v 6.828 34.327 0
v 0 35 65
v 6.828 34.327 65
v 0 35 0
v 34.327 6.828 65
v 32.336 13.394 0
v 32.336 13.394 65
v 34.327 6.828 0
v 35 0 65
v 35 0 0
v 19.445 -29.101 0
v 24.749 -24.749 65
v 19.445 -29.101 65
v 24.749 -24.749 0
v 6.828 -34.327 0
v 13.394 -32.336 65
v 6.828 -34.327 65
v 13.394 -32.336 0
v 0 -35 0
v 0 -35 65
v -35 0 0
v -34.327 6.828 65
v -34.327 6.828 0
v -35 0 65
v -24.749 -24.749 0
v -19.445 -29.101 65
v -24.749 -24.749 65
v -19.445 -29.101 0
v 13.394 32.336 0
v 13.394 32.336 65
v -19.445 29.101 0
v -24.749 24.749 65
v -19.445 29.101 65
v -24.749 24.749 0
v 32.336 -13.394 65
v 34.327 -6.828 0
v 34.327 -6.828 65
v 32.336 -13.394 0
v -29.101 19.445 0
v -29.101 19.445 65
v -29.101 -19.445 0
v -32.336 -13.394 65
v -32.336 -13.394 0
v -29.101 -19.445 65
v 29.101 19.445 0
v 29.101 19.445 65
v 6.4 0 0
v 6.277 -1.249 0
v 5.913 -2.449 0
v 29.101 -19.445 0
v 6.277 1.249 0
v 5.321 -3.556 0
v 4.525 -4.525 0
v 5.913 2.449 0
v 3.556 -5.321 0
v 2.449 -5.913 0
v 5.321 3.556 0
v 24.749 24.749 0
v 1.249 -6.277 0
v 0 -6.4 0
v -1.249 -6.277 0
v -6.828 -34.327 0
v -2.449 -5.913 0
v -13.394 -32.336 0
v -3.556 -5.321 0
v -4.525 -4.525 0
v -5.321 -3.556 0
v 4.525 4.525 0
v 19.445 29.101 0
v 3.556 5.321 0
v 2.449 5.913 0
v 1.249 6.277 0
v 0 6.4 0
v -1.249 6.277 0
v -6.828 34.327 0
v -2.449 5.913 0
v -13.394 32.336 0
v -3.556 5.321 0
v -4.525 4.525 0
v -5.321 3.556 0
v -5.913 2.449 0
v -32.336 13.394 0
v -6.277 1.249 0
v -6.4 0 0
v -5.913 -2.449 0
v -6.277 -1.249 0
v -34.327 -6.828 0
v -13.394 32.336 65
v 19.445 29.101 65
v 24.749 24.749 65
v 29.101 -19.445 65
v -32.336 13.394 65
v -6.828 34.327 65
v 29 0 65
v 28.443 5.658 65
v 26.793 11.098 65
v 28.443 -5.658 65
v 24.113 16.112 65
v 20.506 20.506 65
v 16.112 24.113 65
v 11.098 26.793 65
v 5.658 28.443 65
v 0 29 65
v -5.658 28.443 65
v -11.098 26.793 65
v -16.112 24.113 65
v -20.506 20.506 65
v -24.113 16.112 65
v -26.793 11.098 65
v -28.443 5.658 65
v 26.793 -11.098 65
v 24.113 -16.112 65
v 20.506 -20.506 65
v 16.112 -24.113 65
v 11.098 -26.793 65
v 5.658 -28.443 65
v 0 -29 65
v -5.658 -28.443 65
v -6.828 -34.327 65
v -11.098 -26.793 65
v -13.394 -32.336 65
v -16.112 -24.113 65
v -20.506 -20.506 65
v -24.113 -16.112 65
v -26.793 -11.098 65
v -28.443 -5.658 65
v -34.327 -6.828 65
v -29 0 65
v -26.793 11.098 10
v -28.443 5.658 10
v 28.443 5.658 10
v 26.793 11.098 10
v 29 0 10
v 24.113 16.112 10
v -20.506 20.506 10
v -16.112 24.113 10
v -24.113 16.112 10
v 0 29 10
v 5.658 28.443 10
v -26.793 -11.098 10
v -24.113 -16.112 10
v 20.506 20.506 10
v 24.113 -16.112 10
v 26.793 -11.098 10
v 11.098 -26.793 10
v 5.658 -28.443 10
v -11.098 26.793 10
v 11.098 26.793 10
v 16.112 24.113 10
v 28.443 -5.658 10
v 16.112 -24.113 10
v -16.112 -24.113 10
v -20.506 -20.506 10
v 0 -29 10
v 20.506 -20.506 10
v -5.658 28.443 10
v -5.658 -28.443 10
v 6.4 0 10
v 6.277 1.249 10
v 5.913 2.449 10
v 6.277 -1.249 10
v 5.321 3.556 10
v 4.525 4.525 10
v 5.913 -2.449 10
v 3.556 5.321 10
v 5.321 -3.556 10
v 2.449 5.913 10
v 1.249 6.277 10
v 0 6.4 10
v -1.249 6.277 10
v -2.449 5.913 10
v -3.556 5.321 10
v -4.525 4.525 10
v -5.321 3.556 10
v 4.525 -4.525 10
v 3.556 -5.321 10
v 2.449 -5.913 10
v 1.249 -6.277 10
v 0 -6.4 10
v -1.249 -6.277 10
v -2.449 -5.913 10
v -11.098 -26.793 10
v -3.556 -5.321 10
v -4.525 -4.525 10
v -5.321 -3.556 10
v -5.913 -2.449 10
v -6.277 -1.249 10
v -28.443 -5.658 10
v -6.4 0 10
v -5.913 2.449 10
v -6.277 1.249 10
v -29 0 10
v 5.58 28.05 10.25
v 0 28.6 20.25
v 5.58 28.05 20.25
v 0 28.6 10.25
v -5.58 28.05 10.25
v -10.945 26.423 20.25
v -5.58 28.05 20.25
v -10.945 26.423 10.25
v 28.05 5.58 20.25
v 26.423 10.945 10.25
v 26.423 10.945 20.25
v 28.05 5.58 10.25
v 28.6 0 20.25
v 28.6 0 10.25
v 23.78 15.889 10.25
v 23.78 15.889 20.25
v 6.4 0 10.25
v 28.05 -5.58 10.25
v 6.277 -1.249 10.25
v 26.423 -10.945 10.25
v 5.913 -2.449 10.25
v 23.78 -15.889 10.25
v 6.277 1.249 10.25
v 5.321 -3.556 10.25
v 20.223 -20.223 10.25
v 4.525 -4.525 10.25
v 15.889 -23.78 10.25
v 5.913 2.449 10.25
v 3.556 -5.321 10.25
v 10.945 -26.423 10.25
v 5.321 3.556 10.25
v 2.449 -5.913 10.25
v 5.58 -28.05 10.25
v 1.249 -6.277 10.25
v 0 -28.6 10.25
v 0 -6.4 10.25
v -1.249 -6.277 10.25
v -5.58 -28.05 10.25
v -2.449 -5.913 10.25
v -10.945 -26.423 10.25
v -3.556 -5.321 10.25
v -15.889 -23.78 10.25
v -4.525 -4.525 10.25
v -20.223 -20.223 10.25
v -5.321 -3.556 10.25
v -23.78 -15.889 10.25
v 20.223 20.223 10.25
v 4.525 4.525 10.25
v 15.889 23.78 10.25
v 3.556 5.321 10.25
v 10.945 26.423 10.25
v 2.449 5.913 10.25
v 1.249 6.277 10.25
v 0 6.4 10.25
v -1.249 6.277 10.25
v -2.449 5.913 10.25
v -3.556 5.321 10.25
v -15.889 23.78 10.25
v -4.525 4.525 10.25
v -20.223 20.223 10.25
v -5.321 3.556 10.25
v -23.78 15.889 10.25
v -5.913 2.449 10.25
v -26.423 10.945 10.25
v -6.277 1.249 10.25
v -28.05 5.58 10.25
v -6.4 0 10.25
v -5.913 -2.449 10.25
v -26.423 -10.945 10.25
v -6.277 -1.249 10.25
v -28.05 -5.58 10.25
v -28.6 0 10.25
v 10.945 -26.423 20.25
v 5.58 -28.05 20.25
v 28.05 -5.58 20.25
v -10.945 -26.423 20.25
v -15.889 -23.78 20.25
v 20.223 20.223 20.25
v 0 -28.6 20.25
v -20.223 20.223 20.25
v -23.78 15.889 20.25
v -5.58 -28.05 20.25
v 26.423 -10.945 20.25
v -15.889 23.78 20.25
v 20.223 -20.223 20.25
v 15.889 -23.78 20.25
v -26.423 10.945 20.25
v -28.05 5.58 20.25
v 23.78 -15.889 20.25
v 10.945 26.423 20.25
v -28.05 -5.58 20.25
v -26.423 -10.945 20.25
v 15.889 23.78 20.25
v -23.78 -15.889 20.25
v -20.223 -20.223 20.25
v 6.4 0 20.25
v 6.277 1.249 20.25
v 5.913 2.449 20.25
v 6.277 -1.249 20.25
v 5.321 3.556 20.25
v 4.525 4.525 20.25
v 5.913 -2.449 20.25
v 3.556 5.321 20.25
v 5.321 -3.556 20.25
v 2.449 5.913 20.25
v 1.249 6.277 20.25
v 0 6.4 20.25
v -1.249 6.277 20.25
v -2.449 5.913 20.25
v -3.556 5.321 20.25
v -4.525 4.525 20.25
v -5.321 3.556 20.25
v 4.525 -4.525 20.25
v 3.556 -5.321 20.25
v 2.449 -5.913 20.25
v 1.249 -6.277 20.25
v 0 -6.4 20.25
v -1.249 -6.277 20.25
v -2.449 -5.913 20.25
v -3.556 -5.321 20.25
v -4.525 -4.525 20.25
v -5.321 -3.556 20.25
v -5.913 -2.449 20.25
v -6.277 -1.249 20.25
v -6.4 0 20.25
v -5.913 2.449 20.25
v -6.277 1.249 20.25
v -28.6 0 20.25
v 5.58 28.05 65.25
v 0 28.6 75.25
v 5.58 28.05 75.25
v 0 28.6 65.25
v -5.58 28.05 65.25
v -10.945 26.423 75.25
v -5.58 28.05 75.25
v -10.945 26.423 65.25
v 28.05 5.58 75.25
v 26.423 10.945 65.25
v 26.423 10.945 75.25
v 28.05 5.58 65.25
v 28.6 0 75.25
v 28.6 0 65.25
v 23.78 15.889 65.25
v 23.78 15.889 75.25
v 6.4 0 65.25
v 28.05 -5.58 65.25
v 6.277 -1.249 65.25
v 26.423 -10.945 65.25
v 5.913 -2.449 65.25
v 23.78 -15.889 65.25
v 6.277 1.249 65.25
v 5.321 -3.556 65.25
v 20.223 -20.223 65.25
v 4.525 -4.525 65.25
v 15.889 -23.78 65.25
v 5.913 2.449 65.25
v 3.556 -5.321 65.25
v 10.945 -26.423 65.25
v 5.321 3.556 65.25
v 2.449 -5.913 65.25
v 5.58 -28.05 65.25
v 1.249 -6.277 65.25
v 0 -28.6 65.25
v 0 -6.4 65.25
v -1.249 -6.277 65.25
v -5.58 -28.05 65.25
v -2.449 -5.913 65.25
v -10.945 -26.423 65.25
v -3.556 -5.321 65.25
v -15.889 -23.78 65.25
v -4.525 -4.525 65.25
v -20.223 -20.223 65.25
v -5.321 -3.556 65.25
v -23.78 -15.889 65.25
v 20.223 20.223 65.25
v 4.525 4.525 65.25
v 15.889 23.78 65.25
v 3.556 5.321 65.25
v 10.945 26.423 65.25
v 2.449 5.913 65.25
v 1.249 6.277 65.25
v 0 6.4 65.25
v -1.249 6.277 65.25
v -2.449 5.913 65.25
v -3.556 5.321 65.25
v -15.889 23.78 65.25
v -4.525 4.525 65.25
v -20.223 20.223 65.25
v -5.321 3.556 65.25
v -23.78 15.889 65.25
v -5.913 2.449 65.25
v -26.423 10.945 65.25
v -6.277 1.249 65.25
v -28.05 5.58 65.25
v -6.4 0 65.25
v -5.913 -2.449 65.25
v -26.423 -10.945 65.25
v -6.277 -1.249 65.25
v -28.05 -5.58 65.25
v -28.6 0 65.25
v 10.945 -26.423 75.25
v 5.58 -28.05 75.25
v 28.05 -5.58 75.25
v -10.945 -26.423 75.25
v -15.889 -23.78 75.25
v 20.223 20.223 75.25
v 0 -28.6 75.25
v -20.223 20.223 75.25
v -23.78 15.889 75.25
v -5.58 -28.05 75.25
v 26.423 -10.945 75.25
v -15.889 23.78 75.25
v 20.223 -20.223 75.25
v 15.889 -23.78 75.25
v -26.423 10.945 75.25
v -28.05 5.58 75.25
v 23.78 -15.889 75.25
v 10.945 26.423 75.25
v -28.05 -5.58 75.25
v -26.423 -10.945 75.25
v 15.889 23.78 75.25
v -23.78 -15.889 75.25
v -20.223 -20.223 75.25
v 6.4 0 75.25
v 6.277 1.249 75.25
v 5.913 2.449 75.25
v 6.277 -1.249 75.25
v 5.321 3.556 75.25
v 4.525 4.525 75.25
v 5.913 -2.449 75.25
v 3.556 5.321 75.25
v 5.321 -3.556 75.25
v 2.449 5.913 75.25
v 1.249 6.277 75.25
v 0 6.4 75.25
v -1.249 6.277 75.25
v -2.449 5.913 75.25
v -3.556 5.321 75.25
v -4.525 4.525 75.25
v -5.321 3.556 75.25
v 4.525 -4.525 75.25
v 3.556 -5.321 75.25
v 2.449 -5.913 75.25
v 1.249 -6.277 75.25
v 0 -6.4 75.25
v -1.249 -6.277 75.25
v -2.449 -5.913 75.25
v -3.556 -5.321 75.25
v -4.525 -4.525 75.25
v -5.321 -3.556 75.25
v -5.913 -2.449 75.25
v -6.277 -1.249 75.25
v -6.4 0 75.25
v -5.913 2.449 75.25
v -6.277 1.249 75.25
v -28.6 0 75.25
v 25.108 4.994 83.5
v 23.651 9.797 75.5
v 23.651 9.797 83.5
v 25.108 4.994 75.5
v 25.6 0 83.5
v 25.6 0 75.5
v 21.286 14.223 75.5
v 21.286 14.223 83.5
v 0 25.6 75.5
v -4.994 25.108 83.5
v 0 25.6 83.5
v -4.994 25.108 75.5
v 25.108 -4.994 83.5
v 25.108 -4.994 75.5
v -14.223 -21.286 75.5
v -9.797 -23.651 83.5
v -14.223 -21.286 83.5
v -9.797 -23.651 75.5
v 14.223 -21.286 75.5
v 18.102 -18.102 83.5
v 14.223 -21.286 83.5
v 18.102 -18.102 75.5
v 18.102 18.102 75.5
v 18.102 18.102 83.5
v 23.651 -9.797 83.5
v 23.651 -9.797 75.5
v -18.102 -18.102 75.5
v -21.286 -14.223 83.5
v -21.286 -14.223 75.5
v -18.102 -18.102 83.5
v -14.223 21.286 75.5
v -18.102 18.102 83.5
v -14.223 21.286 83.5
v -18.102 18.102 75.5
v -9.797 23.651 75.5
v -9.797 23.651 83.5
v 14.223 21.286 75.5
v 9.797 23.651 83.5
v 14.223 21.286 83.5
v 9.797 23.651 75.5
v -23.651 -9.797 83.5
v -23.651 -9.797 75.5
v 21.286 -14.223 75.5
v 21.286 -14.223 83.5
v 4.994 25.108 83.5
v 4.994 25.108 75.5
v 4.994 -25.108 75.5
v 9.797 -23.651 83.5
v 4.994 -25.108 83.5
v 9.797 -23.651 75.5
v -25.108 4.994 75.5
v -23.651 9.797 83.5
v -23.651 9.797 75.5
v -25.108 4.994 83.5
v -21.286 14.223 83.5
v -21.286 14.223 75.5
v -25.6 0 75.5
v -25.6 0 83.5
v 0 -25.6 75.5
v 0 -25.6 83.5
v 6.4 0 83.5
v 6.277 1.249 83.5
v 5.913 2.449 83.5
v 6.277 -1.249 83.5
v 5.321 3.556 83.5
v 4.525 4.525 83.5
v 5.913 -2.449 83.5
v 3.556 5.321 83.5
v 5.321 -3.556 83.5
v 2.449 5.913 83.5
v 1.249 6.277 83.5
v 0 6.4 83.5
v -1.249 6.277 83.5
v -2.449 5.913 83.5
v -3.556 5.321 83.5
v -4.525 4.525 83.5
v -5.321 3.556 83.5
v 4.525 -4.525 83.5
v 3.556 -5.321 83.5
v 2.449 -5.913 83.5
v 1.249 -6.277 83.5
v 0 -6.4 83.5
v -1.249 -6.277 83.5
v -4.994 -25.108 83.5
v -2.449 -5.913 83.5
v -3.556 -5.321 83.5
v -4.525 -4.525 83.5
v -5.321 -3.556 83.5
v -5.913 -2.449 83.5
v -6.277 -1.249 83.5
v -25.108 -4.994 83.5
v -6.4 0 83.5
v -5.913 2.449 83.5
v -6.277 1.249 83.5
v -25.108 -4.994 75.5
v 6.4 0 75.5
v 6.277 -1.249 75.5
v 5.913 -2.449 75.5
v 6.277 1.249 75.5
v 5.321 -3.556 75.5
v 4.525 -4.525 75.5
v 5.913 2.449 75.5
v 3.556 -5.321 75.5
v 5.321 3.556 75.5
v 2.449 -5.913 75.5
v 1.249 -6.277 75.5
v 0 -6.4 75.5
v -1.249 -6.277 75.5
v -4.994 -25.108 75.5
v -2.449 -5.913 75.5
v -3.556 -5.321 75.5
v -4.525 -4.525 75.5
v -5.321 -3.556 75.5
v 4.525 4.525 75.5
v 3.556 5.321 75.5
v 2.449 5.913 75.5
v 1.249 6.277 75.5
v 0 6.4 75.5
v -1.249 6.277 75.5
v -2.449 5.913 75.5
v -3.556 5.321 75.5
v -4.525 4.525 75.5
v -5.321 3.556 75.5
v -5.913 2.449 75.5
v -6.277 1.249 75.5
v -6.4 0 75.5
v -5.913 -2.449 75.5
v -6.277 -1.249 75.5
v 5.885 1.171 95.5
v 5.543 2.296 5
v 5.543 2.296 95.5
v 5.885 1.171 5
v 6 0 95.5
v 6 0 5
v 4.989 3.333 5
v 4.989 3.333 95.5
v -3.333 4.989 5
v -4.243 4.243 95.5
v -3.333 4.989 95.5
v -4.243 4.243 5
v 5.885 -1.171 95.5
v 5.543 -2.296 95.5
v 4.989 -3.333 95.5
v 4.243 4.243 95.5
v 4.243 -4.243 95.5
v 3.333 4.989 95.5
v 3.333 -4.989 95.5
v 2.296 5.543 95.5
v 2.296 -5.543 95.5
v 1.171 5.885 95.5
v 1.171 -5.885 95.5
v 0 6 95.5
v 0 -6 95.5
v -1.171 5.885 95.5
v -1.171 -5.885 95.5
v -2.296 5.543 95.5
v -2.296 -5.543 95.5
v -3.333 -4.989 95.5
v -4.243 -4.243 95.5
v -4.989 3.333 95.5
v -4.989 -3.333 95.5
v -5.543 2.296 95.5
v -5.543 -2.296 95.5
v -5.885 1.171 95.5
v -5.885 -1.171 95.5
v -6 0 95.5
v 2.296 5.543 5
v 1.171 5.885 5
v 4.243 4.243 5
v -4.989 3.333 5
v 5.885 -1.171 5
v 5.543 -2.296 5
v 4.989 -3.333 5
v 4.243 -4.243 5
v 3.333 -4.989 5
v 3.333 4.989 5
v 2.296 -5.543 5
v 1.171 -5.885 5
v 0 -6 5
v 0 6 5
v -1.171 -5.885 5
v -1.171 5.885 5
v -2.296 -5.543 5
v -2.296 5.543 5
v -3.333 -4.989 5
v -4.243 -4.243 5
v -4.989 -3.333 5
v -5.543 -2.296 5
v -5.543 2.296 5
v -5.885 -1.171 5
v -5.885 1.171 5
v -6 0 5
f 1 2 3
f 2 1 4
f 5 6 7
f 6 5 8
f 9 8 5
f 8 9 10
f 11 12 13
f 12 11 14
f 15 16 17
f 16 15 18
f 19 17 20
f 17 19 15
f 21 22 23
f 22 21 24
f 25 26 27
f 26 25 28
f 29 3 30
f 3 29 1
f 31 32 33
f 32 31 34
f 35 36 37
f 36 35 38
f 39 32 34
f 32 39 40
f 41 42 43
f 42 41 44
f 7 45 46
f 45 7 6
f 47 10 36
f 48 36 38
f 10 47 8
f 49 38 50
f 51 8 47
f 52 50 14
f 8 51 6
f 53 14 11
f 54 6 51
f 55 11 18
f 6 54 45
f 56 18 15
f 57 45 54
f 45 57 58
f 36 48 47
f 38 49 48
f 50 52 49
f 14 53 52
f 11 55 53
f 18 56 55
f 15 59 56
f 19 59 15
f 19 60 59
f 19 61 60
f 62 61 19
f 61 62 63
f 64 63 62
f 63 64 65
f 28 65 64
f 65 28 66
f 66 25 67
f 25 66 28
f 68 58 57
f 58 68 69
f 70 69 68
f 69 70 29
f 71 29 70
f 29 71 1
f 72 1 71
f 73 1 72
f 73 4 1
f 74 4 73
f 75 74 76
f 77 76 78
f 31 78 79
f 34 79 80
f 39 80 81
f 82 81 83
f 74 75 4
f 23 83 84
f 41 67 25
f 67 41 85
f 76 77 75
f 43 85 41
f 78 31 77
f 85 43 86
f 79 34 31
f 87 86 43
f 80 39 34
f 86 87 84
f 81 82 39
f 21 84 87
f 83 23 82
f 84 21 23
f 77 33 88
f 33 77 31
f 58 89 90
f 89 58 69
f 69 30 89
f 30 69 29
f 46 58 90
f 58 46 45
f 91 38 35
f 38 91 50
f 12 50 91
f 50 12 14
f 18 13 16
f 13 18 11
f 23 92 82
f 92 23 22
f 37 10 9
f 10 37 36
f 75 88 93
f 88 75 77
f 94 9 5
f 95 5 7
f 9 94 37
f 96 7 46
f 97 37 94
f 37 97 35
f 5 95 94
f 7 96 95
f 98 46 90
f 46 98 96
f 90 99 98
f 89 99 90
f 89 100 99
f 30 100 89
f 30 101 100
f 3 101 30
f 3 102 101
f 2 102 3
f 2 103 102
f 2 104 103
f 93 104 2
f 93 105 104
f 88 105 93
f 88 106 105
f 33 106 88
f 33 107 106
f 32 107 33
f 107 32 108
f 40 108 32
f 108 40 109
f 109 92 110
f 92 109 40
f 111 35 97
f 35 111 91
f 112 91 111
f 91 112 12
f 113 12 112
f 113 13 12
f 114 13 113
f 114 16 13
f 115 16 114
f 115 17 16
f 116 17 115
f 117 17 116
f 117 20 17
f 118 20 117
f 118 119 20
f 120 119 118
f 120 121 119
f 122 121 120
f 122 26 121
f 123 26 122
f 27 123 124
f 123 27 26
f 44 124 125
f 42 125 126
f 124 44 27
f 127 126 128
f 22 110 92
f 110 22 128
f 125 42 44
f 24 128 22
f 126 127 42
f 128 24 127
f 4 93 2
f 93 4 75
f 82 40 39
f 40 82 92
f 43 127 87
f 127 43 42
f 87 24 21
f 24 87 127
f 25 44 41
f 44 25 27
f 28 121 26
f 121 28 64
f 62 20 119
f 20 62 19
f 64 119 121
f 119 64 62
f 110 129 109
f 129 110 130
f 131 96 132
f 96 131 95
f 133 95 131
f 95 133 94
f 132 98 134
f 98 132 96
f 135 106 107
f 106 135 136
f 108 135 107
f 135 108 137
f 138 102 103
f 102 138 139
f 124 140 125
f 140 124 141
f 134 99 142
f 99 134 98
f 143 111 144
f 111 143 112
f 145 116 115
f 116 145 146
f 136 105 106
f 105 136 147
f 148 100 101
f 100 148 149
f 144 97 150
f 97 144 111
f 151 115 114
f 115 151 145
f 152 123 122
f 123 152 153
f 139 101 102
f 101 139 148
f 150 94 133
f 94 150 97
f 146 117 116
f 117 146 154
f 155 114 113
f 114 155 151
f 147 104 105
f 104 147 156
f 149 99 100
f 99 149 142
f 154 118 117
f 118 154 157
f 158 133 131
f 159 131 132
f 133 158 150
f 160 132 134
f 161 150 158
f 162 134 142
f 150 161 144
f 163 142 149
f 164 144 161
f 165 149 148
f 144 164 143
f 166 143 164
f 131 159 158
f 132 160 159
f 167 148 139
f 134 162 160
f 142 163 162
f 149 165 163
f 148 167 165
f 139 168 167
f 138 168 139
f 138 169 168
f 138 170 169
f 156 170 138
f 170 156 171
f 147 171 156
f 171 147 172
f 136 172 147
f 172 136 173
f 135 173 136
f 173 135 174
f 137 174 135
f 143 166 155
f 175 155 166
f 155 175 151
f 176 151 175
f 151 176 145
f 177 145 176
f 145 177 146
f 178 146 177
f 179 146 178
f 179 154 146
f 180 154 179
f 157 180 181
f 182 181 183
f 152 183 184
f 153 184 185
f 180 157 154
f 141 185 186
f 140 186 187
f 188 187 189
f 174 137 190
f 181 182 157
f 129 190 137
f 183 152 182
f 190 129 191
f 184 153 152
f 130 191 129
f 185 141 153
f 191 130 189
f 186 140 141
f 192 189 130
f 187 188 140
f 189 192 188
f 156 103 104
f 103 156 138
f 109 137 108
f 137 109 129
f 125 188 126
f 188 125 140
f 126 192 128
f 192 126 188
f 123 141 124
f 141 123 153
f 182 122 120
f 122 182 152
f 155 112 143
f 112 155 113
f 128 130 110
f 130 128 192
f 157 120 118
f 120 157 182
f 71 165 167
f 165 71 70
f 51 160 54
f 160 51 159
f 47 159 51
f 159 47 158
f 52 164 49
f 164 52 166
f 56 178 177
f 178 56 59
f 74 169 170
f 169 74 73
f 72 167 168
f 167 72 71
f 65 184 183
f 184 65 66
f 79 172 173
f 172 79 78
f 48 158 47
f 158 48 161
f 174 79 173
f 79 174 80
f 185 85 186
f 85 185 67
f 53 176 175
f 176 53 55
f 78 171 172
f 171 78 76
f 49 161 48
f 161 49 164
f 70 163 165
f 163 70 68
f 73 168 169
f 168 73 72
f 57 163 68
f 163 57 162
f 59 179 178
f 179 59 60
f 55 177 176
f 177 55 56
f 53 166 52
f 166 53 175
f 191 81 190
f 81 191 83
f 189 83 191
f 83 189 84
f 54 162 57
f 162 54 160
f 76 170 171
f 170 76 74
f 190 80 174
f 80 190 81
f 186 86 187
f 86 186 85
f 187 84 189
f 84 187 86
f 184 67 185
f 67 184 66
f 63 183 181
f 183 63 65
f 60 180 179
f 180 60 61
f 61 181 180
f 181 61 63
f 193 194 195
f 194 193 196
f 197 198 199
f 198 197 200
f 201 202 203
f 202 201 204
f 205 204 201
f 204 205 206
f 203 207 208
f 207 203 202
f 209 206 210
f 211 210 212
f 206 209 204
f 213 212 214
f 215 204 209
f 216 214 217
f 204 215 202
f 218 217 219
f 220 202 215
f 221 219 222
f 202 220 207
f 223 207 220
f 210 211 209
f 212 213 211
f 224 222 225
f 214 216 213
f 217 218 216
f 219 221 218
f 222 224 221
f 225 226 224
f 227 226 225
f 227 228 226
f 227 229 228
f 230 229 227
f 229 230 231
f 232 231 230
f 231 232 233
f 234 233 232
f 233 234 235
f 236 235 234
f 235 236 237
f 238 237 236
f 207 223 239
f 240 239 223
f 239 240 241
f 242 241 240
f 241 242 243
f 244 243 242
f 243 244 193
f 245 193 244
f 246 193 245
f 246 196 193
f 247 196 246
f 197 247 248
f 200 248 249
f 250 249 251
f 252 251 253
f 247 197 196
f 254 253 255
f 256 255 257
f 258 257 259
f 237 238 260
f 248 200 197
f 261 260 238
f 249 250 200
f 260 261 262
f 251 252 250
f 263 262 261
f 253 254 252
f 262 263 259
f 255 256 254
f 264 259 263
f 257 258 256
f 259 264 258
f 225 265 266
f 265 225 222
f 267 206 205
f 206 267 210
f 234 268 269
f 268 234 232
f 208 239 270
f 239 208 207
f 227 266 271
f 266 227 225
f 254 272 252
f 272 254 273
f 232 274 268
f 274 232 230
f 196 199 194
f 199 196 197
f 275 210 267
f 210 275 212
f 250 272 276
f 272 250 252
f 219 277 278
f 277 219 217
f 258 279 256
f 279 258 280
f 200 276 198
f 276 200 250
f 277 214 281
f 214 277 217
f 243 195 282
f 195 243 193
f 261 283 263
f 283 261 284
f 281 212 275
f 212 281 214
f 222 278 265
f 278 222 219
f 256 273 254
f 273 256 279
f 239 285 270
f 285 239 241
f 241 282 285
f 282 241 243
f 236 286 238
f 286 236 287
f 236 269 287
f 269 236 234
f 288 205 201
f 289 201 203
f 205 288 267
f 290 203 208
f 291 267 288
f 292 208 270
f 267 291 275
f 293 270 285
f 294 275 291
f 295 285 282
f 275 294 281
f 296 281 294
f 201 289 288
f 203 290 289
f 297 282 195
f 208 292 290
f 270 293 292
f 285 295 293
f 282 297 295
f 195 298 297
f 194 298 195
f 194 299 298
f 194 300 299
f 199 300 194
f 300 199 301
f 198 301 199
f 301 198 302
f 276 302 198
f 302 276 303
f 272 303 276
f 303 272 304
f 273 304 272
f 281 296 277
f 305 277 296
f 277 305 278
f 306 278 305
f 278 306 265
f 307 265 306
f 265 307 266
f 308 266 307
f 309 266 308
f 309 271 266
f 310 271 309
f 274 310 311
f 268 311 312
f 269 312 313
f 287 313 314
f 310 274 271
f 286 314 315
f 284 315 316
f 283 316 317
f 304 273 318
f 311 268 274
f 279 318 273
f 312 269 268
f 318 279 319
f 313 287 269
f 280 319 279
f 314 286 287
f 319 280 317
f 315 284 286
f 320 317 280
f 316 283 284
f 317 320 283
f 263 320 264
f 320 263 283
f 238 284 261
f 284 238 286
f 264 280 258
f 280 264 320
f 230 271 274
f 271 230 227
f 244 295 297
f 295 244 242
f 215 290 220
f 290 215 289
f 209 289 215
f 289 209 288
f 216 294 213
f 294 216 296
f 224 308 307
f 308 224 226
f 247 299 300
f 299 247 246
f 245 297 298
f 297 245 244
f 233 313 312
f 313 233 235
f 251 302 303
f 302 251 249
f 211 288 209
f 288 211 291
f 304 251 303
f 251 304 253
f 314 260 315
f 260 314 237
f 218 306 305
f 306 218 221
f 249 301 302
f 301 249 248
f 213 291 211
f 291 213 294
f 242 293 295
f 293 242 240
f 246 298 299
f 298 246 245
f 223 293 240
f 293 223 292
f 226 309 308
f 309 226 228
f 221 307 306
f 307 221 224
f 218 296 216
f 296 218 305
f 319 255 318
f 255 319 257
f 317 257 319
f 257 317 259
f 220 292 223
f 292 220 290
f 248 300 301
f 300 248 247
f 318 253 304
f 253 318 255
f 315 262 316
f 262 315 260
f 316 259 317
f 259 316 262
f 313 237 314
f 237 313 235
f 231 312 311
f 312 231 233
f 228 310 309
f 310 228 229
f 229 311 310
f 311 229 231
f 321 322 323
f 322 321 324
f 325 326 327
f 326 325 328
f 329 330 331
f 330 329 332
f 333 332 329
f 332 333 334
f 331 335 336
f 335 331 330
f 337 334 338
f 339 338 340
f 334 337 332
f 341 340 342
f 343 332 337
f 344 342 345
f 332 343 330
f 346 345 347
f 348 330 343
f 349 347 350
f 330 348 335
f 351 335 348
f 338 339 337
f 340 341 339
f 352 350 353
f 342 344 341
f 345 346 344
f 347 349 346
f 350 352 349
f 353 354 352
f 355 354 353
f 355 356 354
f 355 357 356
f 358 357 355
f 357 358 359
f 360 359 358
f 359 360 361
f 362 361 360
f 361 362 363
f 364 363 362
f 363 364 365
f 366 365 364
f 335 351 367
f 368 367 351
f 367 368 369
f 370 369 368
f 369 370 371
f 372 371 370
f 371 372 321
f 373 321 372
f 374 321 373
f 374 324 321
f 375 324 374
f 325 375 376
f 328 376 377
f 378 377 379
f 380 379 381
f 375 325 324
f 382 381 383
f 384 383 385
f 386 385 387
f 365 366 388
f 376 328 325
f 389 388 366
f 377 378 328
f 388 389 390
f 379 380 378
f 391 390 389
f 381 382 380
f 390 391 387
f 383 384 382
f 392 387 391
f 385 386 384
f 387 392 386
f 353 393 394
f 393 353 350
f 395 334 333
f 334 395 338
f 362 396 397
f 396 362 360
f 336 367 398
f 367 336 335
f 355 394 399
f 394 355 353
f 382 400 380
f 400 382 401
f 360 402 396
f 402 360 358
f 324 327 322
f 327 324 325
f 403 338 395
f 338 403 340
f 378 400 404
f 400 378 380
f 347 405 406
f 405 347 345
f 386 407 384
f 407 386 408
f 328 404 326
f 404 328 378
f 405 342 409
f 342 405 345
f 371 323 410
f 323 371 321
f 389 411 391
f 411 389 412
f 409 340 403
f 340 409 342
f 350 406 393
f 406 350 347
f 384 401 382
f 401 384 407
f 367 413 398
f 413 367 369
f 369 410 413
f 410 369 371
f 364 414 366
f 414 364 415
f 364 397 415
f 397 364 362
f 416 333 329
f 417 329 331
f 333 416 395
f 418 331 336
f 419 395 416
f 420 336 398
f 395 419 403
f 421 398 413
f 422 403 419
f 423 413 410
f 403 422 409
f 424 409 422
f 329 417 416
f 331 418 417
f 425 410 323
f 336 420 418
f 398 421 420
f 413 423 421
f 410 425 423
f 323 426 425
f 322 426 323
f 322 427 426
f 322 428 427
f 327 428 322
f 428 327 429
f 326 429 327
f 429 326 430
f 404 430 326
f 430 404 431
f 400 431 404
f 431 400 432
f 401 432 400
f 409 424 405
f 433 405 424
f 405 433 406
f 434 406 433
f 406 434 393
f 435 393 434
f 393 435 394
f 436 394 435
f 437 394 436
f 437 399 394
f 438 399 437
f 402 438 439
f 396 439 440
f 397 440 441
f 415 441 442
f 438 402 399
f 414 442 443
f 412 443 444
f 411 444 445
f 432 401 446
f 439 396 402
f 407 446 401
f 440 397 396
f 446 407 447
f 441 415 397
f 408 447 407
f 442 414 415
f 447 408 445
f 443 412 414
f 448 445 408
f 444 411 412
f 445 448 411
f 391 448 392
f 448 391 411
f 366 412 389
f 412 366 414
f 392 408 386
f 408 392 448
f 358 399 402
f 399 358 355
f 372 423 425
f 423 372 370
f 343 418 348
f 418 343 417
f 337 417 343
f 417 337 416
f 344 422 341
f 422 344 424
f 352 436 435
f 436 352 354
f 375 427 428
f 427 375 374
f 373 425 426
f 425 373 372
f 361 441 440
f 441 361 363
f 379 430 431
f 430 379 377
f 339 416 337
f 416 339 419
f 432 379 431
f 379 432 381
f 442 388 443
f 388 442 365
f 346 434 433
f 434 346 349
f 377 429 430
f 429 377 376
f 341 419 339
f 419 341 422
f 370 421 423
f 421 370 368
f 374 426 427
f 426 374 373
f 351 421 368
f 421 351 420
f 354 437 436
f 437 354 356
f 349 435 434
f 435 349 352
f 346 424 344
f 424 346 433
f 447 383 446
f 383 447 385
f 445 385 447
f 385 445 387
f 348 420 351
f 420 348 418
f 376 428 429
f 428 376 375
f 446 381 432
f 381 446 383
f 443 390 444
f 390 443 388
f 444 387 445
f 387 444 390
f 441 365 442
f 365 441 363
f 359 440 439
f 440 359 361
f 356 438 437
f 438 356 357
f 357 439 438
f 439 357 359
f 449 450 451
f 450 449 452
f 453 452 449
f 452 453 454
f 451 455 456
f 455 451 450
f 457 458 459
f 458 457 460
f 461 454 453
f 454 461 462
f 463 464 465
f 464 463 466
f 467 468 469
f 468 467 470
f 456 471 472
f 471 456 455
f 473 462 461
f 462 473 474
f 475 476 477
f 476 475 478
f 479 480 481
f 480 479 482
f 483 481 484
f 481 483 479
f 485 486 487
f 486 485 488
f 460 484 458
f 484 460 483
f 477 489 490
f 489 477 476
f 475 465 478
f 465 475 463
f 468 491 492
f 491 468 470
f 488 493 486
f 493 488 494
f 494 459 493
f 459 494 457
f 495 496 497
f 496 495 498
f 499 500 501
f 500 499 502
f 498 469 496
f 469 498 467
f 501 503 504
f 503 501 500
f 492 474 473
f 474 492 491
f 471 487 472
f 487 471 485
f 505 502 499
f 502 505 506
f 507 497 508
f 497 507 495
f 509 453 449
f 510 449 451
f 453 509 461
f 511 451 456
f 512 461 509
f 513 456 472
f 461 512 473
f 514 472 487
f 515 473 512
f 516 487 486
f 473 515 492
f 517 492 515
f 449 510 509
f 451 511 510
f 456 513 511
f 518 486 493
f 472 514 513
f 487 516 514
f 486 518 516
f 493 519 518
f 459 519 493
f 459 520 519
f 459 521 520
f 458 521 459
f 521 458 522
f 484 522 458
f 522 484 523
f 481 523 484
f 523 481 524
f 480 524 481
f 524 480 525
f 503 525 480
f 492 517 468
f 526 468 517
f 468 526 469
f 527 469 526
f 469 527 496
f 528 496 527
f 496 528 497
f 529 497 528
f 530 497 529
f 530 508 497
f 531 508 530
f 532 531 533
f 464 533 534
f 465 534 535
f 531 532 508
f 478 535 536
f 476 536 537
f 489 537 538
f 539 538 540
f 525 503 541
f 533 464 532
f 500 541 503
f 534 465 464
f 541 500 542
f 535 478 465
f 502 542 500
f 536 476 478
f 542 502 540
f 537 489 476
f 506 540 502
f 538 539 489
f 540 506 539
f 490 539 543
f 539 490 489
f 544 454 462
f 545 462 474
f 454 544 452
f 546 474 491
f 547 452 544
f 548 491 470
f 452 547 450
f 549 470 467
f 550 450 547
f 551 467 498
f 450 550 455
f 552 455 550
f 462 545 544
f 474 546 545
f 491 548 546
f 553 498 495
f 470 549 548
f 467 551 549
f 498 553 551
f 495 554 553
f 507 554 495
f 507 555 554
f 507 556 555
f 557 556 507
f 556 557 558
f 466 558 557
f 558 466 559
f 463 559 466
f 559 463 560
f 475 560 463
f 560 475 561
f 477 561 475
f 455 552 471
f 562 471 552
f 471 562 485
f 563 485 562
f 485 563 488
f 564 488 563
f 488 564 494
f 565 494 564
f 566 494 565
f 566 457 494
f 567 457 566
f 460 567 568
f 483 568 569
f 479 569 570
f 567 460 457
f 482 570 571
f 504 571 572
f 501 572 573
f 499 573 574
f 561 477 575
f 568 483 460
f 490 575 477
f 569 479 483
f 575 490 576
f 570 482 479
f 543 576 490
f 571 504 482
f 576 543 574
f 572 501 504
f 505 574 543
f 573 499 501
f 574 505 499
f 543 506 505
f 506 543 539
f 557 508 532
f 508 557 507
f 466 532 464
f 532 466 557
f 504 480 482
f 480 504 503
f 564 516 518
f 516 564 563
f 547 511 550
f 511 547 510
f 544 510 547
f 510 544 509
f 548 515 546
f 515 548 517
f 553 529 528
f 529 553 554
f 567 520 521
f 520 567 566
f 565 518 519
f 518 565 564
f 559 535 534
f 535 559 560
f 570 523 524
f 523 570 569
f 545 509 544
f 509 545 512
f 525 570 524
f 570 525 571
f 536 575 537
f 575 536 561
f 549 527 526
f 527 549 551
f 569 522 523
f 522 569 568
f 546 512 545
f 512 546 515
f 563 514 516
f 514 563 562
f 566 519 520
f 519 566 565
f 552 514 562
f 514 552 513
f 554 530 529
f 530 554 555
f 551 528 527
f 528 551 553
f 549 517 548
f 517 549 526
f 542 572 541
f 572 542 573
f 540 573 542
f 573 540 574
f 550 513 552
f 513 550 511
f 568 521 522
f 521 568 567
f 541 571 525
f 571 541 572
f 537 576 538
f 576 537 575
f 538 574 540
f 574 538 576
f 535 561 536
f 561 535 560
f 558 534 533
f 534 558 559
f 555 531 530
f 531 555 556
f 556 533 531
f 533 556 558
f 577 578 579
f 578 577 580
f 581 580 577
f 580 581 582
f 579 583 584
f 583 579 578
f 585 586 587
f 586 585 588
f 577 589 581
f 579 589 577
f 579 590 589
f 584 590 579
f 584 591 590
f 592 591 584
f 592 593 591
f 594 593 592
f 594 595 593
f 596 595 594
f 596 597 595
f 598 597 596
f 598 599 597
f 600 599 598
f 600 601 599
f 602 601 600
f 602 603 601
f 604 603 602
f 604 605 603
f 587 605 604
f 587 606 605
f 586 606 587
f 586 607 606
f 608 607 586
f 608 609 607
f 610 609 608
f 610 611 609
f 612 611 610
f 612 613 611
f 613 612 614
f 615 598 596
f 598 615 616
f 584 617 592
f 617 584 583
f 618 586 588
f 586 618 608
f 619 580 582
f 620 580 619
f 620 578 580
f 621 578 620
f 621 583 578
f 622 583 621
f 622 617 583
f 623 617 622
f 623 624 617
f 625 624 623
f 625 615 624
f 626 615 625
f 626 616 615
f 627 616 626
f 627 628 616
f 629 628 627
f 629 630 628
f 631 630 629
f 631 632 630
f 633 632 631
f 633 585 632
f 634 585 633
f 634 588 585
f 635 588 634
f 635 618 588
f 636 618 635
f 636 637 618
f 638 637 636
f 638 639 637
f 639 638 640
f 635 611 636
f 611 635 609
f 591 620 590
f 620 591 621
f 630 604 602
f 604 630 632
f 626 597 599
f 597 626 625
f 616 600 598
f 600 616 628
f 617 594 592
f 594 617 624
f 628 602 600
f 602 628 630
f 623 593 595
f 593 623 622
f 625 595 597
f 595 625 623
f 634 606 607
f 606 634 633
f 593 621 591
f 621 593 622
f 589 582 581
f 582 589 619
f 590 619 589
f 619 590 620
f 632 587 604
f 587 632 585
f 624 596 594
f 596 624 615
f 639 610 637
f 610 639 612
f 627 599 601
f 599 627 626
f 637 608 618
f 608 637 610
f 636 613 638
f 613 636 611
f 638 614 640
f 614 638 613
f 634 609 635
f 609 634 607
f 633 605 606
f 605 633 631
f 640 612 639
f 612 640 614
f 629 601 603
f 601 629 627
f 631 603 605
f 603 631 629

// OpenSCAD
$fn = 32;

// ------------------------------------------------------------------------
// Bearing housing: housing d70, two bearings and a shaft
// Every part is its own module, assembly() places them once.
// ------------------------------------------------------------------------

// --- part 1 ---
module housing() {
  difference() {
    cylinder(h = 65, d = 70);
    translate([0, 0, 10]) cylinder(h = 56, d = 58);
    translate([0, 0, -1]) cylinder(h = 12, d = 12.8);
  }
}

// --- part 2 ---
module bearing_lower() {
  difference() {
      translate([0, 0, 0]) cylinder(h = 10, d = 57.2);
      translate([0, 0, -1]) cylinder(h = 12, d = 12.8);
    }
}

// --- part 3 ---
module bearing_upper() {
  difference() {
      translate([0, 0, 0]) cylinder(h = 10, d = 57.2);
      translate([0, 0, -1]) cylinder(h = 12, d = 12.8);
    }
}

// --- part 4 ---
module spacer() {
  difference() {
      translate([0, 0, 0]) cylinder(h = 8, d = 51.2);
      translate([0, 0, -1]) cylinder(h = 10, d = 12.8);
    }
}

// --- part 5 ---
module shaft() {
  translate([0, 0, -45.25]) cylinder(h = 90.5, d = 12);
}

// --- assembly ---
module assembly() {
  translate([0, 0, 0]) rotate([0, 0, 0]) housing();
  translate([0, 0, 10.25]) rotate([0, 0, 0]) bearing_lower();
  translate([0, 0, 65.25]) rotate([0, 0, 0]) bearing_upper();
  translate([0, 0, 75.5]) rotate([0, 0, 0]) spacer();
  translate([0, 0, 50.25]) rotate([0, 0, 0]) shaft();
}

assembly();
